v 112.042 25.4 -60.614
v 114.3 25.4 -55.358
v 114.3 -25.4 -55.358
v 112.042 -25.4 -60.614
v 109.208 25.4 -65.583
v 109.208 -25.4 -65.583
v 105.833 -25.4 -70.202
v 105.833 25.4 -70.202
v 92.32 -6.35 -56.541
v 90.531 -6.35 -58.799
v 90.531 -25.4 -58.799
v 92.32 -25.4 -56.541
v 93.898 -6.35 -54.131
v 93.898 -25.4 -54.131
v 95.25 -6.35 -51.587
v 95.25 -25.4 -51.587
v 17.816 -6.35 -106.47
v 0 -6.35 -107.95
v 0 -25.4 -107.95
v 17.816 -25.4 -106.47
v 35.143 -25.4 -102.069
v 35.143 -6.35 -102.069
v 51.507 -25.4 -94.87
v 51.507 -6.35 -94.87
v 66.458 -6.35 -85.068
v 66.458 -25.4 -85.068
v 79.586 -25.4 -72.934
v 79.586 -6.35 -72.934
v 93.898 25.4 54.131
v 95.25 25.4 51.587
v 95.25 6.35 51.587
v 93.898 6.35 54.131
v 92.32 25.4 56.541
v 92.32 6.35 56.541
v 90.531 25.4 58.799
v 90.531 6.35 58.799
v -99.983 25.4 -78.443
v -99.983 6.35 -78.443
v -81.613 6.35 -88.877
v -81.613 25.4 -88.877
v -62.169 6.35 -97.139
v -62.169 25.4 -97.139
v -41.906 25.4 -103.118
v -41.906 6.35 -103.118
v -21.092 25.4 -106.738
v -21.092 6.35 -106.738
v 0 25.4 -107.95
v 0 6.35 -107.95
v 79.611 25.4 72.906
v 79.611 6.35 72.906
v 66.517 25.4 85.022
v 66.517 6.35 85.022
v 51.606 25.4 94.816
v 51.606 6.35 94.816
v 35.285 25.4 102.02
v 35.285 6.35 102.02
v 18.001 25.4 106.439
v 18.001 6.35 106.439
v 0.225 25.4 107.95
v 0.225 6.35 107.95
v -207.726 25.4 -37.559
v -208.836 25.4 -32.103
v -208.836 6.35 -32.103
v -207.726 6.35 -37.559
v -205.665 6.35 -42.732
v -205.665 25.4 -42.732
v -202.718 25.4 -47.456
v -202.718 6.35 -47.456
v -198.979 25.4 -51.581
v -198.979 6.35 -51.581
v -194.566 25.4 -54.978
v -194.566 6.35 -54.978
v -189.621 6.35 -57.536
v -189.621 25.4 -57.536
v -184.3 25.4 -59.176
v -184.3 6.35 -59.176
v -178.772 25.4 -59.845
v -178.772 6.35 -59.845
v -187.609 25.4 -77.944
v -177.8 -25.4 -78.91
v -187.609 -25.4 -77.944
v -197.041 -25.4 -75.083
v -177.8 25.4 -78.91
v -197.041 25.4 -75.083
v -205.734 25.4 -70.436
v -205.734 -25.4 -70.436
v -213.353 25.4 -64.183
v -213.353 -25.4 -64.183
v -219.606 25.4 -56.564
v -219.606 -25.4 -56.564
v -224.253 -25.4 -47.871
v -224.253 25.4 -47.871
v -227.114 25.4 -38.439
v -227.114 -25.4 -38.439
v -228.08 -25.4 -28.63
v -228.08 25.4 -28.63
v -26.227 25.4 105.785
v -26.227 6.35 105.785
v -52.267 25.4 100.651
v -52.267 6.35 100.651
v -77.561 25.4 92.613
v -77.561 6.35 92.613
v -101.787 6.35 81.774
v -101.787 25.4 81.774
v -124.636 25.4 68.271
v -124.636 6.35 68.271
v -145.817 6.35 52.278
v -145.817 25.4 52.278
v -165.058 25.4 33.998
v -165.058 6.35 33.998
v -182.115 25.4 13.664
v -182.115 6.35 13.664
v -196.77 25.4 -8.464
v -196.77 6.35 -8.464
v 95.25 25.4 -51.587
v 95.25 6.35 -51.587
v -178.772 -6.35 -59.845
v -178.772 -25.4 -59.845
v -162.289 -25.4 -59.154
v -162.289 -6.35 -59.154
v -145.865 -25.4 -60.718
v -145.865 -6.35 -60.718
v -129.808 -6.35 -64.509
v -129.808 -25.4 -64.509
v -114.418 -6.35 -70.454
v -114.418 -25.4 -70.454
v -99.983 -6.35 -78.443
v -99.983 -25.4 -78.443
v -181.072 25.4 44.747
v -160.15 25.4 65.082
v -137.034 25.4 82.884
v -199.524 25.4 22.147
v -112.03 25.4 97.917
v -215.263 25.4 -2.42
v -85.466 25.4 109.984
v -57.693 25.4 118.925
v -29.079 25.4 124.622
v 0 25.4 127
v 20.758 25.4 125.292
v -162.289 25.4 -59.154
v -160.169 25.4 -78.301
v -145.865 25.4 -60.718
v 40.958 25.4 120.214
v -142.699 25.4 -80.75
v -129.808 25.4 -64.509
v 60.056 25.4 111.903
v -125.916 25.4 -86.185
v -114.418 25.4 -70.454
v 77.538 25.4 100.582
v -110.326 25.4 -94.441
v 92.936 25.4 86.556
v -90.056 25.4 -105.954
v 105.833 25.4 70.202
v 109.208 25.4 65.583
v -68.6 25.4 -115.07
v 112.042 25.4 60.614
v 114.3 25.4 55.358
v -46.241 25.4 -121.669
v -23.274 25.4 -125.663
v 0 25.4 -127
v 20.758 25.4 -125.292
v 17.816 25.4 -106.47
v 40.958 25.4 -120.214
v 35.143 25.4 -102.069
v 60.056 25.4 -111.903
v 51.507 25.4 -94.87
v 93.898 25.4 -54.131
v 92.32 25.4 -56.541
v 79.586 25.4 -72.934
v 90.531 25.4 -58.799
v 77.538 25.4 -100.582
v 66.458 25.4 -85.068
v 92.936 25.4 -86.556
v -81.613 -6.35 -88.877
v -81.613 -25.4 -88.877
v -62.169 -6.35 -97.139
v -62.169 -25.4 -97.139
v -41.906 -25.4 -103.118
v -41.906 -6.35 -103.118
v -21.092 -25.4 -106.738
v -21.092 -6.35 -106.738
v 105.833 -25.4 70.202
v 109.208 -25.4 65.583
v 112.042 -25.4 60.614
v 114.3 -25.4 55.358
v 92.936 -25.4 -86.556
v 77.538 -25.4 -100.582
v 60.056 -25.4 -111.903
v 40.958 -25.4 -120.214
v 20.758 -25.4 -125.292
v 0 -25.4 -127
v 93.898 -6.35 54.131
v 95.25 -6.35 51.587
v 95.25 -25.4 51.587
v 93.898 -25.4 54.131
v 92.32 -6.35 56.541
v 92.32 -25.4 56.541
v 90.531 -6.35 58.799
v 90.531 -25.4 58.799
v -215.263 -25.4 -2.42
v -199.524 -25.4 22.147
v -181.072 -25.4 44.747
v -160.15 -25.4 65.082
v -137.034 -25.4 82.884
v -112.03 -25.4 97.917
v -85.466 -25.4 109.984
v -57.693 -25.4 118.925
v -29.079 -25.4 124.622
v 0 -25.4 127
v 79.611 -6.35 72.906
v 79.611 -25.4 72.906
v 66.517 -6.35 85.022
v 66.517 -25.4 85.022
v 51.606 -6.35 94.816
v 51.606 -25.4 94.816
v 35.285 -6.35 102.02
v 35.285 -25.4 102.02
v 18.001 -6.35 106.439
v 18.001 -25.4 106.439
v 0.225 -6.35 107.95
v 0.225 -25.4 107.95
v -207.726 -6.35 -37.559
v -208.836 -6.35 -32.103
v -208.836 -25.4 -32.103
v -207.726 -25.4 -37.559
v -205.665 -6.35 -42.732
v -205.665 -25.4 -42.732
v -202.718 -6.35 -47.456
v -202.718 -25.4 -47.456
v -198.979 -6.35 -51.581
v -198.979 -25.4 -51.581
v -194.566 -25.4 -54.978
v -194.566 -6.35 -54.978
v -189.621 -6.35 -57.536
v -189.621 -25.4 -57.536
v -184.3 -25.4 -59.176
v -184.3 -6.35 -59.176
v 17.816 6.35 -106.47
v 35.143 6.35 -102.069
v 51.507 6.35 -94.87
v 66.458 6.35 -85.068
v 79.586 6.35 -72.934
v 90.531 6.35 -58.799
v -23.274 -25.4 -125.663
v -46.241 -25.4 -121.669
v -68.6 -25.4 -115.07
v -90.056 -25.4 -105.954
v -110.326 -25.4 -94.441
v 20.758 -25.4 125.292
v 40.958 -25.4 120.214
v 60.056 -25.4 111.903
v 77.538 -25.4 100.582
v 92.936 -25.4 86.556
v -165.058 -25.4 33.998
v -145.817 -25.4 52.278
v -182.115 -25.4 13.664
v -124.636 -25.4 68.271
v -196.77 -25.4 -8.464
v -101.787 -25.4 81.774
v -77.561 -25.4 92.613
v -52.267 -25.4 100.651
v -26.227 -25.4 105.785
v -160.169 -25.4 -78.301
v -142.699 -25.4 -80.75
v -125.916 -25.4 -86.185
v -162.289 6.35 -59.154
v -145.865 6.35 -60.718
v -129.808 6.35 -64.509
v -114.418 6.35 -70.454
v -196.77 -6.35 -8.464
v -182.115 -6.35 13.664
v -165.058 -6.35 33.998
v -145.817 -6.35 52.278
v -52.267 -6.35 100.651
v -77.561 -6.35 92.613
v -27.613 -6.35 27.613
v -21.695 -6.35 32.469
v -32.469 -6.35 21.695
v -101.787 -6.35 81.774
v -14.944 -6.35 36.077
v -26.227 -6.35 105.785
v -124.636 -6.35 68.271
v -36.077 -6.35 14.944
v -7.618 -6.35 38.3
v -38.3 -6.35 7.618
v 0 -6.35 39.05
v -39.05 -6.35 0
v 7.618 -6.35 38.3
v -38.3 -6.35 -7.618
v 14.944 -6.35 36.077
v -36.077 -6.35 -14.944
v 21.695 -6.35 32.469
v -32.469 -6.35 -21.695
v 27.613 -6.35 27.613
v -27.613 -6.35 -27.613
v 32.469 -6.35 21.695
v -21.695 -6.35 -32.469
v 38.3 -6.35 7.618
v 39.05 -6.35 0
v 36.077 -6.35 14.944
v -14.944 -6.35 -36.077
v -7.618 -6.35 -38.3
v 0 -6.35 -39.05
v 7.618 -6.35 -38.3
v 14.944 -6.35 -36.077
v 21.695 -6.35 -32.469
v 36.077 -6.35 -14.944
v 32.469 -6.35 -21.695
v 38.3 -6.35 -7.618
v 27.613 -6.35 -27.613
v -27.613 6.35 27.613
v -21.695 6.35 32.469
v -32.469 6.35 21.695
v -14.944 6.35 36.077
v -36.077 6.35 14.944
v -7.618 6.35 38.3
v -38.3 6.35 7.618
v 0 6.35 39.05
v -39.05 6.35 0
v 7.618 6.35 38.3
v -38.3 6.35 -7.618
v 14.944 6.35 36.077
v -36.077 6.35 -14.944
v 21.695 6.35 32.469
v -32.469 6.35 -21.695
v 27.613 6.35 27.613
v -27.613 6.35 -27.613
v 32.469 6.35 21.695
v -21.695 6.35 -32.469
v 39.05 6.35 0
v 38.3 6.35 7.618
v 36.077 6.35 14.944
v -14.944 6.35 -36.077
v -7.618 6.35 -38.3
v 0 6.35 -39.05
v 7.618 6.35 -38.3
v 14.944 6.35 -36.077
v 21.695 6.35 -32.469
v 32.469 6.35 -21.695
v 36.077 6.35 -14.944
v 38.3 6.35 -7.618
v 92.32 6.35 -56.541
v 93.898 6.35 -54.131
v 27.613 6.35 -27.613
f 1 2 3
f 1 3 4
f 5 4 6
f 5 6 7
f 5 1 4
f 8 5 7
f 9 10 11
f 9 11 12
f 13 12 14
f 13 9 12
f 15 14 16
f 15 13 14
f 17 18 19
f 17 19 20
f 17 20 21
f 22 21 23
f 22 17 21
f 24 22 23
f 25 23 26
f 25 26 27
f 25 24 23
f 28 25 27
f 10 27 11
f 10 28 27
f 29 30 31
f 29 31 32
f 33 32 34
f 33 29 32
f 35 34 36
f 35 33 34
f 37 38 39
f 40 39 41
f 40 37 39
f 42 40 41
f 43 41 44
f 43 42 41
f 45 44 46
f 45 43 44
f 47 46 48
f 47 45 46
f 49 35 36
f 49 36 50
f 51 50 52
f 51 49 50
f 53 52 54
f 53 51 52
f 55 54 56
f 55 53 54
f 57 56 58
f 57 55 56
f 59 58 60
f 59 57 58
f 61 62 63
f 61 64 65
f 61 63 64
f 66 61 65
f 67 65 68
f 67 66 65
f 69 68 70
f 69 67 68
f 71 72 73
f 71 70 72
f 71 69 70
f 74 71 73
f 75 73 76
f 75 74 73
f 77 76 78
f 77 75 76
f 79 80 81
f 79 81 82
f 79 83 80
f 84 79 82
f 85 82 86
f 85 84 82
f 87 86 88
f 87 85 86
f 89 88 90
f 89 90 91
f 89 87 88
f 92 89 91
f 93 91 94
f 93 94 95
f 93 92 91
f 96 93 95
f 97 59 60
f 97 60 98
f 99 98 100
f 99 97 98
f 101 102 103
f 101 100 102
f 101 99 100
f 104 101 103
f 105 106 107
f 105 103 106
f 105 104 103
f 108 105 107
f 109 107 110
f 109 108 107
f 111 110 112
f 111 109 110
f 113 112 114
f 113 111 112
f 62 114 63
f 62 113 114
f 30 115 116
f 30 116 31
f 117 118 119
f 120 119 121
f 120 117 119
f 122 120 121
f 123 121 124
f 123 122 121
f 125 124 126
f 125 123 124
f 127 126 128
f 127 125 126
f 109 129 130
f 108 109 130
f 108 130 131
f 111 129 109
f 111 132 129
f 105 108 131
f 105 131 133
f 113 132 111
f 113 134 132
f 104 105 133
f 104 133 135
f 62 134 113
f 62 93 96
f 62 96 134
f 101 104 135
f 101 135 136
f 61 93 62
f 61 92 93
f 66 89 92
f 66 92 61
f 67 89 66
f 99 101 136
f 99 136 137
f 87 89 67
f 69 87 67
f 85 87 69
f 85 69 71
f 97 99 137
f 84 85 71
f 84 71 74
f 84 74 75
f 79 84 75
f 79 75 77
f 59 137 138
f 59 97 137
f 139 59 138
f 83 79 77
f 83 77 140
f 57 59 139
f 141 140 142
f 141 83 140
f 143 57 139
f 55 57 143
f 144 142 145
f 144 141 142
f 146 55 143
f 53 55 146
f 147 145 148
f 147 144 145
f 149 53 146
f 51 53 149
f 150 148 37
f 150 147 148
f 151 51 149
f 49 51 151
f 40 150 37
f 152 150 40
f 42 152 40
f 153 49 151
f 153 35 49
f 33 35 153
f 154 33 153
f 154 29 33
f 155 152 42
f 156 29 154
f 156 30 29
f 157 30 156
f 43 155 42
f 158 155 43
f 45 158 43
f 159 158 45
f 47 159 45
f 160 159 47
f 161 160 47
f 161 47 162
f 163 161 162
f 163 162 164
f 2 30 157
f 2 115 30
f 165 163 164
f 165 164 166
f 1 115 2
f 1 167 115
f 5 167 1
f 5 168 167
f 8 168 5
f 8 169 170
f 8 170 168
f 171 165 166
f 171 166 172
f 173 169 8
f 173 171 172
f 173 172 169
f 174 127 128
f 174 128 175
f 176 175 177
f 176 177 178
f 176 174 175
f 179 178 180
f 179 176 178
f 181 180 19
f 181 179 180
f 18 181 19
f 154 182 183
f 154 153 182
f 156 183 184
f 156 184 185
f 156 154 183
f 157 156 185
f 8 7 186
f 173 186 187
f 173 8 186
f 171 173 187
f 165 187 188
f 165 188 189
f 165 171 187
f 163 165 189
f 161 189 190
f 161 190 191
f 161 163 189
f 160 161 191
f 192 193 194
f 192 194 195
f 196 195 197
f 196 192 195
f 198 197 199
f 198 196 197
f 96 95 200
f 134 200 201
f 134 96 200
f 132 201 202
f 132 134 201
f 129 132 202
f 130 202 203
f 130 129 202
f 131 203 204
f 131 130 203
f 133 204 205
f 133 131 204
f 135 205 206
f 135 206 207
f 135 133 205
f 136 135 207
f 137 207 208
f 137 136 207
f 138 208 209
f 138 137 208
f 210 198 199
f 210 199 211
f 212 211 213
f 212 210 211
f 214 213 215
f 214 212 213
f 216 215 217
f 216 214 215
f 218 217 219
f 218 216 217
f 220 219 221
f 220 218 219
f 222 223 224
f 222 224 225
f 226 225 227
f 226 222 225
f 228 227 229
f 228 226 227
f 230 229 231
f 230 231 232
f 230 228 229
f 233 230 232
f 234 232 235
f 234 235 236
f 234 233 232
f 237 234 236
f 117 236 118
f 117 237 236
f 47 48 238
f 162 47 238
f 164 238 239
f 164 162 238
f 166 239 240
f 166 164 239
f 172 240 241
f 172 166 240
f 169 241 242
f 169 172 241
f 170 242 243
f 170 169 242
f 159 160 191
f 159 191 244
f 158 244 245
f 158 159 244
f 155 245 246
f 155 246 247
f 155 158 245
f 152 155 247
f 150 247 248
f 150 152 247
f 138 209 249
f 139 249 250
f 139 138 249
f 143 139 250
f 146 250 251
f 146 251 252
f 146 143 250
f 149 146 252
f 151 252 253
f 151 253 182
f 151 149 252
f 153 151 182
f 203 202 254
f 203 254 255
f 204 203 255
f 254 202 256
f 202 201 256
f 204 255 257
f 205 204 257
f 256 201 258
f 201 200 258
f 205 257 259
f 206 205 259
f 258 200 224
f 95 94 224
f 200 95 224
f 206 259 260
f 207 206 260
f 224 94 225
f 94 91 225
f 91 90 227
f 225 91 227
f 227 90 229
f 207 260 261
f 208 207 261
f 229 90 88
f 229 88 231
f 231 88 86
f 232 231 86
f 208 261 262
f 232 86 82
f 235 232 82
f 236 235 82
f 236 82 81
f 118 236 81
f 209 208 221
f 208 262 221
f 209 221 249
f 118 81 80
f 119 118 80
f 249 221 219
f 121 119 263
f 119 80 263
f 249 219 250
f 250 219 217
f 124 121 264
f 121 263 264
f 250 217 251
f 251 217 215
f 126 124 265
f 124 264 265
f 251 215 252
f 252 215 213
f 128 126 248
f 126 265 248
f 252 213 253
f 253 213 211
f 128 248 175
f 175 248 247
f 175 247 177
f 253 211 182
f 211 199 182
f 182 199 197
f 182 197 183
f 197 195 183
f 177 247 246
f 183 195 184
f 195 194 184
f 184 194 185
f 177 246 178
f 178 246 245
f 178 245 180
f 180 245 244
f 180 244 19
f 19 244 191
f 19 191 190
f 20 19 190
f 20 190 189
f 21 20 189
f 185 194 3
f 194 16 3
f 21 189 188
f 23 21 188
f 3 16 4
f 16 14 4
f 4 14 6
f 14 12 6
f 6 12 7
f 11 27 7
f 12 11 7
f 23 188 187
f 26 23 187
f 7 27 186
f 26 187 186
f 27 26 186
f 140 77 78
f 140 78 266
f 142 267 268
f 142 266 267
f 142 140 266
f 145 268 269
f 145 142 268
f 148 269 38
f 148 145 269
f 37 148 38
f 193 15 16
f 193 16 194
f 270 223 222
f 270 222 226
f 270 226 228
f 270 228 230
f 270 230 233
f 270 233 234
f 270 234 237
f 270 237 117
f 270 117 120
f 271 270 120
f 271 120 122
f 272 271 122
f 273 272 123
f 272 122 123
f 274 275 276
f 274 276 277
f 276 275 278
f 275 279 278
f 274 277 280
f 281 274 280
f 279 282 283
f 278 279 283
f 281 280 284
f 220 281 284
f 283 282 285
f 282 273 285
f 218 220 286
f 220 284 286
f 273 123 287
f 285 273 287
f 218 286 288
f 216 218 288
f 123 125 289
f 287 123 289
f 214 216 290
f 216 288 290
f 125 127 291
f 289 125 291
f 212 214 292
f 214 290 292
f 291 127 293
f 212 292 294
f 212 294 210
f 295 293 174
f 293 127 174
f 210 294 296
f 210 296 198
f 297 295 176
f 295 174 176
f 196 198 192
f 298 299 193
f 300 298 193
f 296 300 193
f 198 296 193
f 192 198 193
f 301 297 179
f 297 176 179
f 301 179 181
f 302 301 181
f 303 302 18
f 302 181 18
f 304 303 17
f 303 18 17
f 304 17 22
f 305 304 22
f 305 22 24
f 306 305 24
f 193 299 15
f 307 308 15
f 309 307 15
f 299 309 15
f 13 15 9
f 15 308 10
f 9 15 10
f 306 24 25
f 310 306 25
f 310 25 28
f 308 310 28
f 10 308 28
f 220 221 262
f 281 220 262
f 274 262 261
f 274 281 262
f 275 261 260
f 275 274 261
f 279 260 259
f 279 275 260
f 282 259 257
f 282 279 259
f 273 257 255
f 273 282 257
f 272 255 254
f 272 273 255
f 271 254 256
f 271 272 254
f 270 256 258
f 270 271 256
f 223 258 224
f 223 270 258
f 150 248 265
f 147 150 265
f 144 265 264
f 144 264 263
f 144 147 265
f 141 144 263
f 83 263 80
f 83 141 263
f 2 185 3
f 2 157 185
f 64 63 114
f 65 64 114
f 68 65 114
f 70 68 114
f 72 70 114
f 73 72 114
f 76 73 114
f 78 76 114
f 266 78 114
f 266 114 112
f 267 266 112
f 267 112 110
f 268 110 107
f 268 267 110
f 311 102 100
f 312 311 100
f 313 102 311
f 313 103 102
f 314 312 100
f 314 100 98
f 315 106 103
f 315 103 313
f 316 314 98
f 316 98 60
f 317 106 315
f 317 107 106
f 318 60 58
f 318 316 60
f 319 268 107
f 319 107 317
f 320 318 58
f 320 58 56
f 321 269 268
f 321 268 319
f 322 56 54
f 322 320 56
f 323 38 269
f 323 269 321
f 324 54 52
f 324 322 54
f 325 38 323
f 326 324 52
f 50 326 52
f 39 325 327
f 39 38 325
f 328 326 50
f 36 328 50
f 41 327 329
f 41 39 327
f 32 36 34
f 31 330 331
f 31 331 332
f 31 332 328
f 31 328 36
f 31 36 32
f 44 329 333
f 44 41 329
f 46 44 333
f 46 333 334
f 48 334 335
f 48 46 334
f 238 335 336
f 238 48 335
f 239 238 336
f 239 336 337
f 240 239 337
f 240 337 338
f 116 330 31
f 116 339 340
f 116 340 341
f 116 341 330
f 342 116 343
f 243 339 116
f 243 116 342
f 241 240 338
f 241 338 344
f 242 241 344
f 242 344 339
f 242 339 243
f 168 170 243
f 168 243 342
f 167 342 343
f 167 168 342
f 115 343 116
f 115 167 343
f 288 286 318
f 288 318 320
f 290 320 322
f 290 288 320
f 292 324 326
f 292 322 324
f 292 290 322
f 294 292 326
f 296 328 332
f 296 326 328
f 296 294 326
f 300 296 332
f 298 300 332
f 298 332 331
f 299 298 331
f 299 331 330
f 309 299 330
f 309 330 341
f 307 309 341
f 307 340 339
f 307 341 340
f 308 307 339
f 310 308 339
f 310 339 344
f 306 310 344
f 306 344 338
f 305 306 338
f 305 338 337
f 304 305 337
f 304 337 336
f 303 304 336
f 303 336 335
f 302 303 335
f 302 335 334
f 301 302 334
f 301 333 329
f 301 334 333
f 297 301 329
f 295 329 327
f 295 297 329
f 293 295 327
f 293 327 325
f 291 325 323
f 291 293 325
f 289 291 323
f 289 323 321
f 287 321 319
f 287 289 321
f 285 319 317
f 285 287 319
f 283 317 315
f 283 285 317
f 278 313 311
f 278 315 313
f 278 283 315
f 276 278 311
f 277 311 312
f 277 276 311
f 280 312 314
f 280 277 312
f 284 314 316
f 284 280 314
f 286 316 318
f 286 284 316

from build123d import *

# Parameters (mm, degrees)
BOSS_EXTRUDE1_DEPTH     = 6.35
BOSS_EXTRUDE3_DEPTH     = 25.4
CUT_EXTRUDE1_DEPTH      = 263.978228947
CUT_EXTRUDE1_DEPTH_BACK = 263.978228947
SKETCH2_R               = 39.05


with BuildPart() as part:
    # Sketch1 → Boss-Extrude1 (new, symmetric)
    with BuildSketch(Plane(origin=(0, 0, 0), x_dir=(1, 0, 0), z_dir=(0, 1, 0))):
        with BuildLine():
            Line((95.25, -51.587287188), (95.25, -42.12))
            Line((95.25, -42.12), (95.25, 42.12))
            Line((95.25, 42.12), (95.25, 51.587287188))
            ThreePointArc((95.25, 51.587287188), (93.136460997, 55.353844077), (90.531290228, 58.798707381))
            ThreePointArc((90.531290228, 58.798707381), (51.506708486, 94.86970792), (0, 107.95))
            ThreePointArc((0, 107.95), (-52.123153766, 100.419362872), (-99.983255054, 78.443367814))
            ThreePointArc((-99.983255054, 78.443367814), (-137.771381999, 62.338580791), (-178.772455636, 59.844855919))
            ThreePointArc((-178.772455636, 59.844855919), (-198.978805326, 51.581494612), (-208.83628251, 32.103048795))
            ThreePointArc((-208.83628251, 32.103048795), (-124.636067917, -68.271246819), (0.22501695, -107.949765481))
            ThreePointArc((0.22501695, -107.949765481), (51.605556398, -94.81597465), (90.531290228, -58.798707381))
            ThreePointArc((90.531290228, -58.798707381), (93.136460997, -55.353844077), (95.25, -51.587287188))
        make_face()
    extrude(amount=BOSS_EXTRUDE1_DEPTH, both=True)

    # Sketch1<4> → Boss-Extrude3 (add, symmetric)
    with BuildSketch(Plane(origin=(0, 0, 0), x_dir=(1, 0, 0), z_dir=(0, 1, 0))):
        with BuildLine():
            Line((114.3, -55.358016583), (114.3, 55.358016583))
            ThreePointArc((114.3, 55.358016583), (110.69531577, 63.1385236), (105.833333333, 70.201891396))
            ThreePointArc((105.833333333, 70.201891396), (60.055640005, 111.903172894), (0, 127))
            ThreePointArc((0, 127), (-57.515204156, 118.690331445), (-110.326350404, 94.440957588))
            ThreePointArc((-110.326350404, 94.440957588), (-142.699370878, 80.750483212), (-177.8, 78.91))
            ThreePointArc((-177.8, 78.91), (-213.353328958, 64.183328958), (-228.08, 28.63))
            ThreePointArc((-228.08, 28.63), (-137.03440171, -82.883921429), (0, -127))
            ThreePointArc((0, -127), (60.055640005, -111.903172894), (105.833333333, -70.201891396))
            ThreePointArc((105.833333333, -70.201891396), (110.69531577, -63.1385236), (114.3, -55.358016583))
        make_face()
        with BuildLine():
            Line((95.25, 42.12), (95.25, -42.12))
            Line((95.25, -42.12), (95.25, -51.587287188))
            ThreePointArc((95.25, -51.587287188), (93.136460997, -55.353844077), (90.531290228, -58.798707381))
            ThreePointArc((90.531290228, -58.798707381), (51.605556398, -94.81597465), (0.22501695, -107.949765481))
            ThreePointArc((0.22501695, -107.949765481), (-124.636067917, -68.271246819), (-208.83628251, 32.103048795))
            ThreePointArc((-208.83628251, 32.103048795), (-198.978805326, 51.581494612), (-178.772455636, 59.844855919))
            ThreePointArc((-178.772455636, 59.844855919), (-137.771381999, 62.338580791), (-99.983255054, 78.443367814))
            ThreePointArc((-99.983255054, 78.443367814), (-52.123153766, 100.419362872), (0, 107.95))
            ThreePointArc((0, 107.95), (51.506708486, 94.86970792), (90.531290228, 58.798707381))
            ThreePointArc((90.531290228, 58.798707381), (93.136460997, 55.353844077), (95.25, 51.587287188))
            Line((95.25, 51.587287188), (95.25, 42.12))
        make_face(mode=Mode.SUBTRACT)
    extrude(amount=BOSS_EXTRUDE3_DEPTH, both=True)

    # Sketch2 → Cut-Extrude1 (cut, two sides: drawn at the far end of the back side and taken through both)
    with BuildSketch(Plane(origin=(0, 6.35, 0), x_dir=(1, 0, 0), z_dir=(0, 1, 0)).offset(-CUT_EXTRUDE1_DEPTH_BACK)):
        Circle(SKETCH2_R)
    extrude(amount=CUT_EXTRUDE1_DEPTH + CUT_EXTRUDE1_DEPTH_BACK, mode=Mode.SUBTRACT)


solid = part.part
